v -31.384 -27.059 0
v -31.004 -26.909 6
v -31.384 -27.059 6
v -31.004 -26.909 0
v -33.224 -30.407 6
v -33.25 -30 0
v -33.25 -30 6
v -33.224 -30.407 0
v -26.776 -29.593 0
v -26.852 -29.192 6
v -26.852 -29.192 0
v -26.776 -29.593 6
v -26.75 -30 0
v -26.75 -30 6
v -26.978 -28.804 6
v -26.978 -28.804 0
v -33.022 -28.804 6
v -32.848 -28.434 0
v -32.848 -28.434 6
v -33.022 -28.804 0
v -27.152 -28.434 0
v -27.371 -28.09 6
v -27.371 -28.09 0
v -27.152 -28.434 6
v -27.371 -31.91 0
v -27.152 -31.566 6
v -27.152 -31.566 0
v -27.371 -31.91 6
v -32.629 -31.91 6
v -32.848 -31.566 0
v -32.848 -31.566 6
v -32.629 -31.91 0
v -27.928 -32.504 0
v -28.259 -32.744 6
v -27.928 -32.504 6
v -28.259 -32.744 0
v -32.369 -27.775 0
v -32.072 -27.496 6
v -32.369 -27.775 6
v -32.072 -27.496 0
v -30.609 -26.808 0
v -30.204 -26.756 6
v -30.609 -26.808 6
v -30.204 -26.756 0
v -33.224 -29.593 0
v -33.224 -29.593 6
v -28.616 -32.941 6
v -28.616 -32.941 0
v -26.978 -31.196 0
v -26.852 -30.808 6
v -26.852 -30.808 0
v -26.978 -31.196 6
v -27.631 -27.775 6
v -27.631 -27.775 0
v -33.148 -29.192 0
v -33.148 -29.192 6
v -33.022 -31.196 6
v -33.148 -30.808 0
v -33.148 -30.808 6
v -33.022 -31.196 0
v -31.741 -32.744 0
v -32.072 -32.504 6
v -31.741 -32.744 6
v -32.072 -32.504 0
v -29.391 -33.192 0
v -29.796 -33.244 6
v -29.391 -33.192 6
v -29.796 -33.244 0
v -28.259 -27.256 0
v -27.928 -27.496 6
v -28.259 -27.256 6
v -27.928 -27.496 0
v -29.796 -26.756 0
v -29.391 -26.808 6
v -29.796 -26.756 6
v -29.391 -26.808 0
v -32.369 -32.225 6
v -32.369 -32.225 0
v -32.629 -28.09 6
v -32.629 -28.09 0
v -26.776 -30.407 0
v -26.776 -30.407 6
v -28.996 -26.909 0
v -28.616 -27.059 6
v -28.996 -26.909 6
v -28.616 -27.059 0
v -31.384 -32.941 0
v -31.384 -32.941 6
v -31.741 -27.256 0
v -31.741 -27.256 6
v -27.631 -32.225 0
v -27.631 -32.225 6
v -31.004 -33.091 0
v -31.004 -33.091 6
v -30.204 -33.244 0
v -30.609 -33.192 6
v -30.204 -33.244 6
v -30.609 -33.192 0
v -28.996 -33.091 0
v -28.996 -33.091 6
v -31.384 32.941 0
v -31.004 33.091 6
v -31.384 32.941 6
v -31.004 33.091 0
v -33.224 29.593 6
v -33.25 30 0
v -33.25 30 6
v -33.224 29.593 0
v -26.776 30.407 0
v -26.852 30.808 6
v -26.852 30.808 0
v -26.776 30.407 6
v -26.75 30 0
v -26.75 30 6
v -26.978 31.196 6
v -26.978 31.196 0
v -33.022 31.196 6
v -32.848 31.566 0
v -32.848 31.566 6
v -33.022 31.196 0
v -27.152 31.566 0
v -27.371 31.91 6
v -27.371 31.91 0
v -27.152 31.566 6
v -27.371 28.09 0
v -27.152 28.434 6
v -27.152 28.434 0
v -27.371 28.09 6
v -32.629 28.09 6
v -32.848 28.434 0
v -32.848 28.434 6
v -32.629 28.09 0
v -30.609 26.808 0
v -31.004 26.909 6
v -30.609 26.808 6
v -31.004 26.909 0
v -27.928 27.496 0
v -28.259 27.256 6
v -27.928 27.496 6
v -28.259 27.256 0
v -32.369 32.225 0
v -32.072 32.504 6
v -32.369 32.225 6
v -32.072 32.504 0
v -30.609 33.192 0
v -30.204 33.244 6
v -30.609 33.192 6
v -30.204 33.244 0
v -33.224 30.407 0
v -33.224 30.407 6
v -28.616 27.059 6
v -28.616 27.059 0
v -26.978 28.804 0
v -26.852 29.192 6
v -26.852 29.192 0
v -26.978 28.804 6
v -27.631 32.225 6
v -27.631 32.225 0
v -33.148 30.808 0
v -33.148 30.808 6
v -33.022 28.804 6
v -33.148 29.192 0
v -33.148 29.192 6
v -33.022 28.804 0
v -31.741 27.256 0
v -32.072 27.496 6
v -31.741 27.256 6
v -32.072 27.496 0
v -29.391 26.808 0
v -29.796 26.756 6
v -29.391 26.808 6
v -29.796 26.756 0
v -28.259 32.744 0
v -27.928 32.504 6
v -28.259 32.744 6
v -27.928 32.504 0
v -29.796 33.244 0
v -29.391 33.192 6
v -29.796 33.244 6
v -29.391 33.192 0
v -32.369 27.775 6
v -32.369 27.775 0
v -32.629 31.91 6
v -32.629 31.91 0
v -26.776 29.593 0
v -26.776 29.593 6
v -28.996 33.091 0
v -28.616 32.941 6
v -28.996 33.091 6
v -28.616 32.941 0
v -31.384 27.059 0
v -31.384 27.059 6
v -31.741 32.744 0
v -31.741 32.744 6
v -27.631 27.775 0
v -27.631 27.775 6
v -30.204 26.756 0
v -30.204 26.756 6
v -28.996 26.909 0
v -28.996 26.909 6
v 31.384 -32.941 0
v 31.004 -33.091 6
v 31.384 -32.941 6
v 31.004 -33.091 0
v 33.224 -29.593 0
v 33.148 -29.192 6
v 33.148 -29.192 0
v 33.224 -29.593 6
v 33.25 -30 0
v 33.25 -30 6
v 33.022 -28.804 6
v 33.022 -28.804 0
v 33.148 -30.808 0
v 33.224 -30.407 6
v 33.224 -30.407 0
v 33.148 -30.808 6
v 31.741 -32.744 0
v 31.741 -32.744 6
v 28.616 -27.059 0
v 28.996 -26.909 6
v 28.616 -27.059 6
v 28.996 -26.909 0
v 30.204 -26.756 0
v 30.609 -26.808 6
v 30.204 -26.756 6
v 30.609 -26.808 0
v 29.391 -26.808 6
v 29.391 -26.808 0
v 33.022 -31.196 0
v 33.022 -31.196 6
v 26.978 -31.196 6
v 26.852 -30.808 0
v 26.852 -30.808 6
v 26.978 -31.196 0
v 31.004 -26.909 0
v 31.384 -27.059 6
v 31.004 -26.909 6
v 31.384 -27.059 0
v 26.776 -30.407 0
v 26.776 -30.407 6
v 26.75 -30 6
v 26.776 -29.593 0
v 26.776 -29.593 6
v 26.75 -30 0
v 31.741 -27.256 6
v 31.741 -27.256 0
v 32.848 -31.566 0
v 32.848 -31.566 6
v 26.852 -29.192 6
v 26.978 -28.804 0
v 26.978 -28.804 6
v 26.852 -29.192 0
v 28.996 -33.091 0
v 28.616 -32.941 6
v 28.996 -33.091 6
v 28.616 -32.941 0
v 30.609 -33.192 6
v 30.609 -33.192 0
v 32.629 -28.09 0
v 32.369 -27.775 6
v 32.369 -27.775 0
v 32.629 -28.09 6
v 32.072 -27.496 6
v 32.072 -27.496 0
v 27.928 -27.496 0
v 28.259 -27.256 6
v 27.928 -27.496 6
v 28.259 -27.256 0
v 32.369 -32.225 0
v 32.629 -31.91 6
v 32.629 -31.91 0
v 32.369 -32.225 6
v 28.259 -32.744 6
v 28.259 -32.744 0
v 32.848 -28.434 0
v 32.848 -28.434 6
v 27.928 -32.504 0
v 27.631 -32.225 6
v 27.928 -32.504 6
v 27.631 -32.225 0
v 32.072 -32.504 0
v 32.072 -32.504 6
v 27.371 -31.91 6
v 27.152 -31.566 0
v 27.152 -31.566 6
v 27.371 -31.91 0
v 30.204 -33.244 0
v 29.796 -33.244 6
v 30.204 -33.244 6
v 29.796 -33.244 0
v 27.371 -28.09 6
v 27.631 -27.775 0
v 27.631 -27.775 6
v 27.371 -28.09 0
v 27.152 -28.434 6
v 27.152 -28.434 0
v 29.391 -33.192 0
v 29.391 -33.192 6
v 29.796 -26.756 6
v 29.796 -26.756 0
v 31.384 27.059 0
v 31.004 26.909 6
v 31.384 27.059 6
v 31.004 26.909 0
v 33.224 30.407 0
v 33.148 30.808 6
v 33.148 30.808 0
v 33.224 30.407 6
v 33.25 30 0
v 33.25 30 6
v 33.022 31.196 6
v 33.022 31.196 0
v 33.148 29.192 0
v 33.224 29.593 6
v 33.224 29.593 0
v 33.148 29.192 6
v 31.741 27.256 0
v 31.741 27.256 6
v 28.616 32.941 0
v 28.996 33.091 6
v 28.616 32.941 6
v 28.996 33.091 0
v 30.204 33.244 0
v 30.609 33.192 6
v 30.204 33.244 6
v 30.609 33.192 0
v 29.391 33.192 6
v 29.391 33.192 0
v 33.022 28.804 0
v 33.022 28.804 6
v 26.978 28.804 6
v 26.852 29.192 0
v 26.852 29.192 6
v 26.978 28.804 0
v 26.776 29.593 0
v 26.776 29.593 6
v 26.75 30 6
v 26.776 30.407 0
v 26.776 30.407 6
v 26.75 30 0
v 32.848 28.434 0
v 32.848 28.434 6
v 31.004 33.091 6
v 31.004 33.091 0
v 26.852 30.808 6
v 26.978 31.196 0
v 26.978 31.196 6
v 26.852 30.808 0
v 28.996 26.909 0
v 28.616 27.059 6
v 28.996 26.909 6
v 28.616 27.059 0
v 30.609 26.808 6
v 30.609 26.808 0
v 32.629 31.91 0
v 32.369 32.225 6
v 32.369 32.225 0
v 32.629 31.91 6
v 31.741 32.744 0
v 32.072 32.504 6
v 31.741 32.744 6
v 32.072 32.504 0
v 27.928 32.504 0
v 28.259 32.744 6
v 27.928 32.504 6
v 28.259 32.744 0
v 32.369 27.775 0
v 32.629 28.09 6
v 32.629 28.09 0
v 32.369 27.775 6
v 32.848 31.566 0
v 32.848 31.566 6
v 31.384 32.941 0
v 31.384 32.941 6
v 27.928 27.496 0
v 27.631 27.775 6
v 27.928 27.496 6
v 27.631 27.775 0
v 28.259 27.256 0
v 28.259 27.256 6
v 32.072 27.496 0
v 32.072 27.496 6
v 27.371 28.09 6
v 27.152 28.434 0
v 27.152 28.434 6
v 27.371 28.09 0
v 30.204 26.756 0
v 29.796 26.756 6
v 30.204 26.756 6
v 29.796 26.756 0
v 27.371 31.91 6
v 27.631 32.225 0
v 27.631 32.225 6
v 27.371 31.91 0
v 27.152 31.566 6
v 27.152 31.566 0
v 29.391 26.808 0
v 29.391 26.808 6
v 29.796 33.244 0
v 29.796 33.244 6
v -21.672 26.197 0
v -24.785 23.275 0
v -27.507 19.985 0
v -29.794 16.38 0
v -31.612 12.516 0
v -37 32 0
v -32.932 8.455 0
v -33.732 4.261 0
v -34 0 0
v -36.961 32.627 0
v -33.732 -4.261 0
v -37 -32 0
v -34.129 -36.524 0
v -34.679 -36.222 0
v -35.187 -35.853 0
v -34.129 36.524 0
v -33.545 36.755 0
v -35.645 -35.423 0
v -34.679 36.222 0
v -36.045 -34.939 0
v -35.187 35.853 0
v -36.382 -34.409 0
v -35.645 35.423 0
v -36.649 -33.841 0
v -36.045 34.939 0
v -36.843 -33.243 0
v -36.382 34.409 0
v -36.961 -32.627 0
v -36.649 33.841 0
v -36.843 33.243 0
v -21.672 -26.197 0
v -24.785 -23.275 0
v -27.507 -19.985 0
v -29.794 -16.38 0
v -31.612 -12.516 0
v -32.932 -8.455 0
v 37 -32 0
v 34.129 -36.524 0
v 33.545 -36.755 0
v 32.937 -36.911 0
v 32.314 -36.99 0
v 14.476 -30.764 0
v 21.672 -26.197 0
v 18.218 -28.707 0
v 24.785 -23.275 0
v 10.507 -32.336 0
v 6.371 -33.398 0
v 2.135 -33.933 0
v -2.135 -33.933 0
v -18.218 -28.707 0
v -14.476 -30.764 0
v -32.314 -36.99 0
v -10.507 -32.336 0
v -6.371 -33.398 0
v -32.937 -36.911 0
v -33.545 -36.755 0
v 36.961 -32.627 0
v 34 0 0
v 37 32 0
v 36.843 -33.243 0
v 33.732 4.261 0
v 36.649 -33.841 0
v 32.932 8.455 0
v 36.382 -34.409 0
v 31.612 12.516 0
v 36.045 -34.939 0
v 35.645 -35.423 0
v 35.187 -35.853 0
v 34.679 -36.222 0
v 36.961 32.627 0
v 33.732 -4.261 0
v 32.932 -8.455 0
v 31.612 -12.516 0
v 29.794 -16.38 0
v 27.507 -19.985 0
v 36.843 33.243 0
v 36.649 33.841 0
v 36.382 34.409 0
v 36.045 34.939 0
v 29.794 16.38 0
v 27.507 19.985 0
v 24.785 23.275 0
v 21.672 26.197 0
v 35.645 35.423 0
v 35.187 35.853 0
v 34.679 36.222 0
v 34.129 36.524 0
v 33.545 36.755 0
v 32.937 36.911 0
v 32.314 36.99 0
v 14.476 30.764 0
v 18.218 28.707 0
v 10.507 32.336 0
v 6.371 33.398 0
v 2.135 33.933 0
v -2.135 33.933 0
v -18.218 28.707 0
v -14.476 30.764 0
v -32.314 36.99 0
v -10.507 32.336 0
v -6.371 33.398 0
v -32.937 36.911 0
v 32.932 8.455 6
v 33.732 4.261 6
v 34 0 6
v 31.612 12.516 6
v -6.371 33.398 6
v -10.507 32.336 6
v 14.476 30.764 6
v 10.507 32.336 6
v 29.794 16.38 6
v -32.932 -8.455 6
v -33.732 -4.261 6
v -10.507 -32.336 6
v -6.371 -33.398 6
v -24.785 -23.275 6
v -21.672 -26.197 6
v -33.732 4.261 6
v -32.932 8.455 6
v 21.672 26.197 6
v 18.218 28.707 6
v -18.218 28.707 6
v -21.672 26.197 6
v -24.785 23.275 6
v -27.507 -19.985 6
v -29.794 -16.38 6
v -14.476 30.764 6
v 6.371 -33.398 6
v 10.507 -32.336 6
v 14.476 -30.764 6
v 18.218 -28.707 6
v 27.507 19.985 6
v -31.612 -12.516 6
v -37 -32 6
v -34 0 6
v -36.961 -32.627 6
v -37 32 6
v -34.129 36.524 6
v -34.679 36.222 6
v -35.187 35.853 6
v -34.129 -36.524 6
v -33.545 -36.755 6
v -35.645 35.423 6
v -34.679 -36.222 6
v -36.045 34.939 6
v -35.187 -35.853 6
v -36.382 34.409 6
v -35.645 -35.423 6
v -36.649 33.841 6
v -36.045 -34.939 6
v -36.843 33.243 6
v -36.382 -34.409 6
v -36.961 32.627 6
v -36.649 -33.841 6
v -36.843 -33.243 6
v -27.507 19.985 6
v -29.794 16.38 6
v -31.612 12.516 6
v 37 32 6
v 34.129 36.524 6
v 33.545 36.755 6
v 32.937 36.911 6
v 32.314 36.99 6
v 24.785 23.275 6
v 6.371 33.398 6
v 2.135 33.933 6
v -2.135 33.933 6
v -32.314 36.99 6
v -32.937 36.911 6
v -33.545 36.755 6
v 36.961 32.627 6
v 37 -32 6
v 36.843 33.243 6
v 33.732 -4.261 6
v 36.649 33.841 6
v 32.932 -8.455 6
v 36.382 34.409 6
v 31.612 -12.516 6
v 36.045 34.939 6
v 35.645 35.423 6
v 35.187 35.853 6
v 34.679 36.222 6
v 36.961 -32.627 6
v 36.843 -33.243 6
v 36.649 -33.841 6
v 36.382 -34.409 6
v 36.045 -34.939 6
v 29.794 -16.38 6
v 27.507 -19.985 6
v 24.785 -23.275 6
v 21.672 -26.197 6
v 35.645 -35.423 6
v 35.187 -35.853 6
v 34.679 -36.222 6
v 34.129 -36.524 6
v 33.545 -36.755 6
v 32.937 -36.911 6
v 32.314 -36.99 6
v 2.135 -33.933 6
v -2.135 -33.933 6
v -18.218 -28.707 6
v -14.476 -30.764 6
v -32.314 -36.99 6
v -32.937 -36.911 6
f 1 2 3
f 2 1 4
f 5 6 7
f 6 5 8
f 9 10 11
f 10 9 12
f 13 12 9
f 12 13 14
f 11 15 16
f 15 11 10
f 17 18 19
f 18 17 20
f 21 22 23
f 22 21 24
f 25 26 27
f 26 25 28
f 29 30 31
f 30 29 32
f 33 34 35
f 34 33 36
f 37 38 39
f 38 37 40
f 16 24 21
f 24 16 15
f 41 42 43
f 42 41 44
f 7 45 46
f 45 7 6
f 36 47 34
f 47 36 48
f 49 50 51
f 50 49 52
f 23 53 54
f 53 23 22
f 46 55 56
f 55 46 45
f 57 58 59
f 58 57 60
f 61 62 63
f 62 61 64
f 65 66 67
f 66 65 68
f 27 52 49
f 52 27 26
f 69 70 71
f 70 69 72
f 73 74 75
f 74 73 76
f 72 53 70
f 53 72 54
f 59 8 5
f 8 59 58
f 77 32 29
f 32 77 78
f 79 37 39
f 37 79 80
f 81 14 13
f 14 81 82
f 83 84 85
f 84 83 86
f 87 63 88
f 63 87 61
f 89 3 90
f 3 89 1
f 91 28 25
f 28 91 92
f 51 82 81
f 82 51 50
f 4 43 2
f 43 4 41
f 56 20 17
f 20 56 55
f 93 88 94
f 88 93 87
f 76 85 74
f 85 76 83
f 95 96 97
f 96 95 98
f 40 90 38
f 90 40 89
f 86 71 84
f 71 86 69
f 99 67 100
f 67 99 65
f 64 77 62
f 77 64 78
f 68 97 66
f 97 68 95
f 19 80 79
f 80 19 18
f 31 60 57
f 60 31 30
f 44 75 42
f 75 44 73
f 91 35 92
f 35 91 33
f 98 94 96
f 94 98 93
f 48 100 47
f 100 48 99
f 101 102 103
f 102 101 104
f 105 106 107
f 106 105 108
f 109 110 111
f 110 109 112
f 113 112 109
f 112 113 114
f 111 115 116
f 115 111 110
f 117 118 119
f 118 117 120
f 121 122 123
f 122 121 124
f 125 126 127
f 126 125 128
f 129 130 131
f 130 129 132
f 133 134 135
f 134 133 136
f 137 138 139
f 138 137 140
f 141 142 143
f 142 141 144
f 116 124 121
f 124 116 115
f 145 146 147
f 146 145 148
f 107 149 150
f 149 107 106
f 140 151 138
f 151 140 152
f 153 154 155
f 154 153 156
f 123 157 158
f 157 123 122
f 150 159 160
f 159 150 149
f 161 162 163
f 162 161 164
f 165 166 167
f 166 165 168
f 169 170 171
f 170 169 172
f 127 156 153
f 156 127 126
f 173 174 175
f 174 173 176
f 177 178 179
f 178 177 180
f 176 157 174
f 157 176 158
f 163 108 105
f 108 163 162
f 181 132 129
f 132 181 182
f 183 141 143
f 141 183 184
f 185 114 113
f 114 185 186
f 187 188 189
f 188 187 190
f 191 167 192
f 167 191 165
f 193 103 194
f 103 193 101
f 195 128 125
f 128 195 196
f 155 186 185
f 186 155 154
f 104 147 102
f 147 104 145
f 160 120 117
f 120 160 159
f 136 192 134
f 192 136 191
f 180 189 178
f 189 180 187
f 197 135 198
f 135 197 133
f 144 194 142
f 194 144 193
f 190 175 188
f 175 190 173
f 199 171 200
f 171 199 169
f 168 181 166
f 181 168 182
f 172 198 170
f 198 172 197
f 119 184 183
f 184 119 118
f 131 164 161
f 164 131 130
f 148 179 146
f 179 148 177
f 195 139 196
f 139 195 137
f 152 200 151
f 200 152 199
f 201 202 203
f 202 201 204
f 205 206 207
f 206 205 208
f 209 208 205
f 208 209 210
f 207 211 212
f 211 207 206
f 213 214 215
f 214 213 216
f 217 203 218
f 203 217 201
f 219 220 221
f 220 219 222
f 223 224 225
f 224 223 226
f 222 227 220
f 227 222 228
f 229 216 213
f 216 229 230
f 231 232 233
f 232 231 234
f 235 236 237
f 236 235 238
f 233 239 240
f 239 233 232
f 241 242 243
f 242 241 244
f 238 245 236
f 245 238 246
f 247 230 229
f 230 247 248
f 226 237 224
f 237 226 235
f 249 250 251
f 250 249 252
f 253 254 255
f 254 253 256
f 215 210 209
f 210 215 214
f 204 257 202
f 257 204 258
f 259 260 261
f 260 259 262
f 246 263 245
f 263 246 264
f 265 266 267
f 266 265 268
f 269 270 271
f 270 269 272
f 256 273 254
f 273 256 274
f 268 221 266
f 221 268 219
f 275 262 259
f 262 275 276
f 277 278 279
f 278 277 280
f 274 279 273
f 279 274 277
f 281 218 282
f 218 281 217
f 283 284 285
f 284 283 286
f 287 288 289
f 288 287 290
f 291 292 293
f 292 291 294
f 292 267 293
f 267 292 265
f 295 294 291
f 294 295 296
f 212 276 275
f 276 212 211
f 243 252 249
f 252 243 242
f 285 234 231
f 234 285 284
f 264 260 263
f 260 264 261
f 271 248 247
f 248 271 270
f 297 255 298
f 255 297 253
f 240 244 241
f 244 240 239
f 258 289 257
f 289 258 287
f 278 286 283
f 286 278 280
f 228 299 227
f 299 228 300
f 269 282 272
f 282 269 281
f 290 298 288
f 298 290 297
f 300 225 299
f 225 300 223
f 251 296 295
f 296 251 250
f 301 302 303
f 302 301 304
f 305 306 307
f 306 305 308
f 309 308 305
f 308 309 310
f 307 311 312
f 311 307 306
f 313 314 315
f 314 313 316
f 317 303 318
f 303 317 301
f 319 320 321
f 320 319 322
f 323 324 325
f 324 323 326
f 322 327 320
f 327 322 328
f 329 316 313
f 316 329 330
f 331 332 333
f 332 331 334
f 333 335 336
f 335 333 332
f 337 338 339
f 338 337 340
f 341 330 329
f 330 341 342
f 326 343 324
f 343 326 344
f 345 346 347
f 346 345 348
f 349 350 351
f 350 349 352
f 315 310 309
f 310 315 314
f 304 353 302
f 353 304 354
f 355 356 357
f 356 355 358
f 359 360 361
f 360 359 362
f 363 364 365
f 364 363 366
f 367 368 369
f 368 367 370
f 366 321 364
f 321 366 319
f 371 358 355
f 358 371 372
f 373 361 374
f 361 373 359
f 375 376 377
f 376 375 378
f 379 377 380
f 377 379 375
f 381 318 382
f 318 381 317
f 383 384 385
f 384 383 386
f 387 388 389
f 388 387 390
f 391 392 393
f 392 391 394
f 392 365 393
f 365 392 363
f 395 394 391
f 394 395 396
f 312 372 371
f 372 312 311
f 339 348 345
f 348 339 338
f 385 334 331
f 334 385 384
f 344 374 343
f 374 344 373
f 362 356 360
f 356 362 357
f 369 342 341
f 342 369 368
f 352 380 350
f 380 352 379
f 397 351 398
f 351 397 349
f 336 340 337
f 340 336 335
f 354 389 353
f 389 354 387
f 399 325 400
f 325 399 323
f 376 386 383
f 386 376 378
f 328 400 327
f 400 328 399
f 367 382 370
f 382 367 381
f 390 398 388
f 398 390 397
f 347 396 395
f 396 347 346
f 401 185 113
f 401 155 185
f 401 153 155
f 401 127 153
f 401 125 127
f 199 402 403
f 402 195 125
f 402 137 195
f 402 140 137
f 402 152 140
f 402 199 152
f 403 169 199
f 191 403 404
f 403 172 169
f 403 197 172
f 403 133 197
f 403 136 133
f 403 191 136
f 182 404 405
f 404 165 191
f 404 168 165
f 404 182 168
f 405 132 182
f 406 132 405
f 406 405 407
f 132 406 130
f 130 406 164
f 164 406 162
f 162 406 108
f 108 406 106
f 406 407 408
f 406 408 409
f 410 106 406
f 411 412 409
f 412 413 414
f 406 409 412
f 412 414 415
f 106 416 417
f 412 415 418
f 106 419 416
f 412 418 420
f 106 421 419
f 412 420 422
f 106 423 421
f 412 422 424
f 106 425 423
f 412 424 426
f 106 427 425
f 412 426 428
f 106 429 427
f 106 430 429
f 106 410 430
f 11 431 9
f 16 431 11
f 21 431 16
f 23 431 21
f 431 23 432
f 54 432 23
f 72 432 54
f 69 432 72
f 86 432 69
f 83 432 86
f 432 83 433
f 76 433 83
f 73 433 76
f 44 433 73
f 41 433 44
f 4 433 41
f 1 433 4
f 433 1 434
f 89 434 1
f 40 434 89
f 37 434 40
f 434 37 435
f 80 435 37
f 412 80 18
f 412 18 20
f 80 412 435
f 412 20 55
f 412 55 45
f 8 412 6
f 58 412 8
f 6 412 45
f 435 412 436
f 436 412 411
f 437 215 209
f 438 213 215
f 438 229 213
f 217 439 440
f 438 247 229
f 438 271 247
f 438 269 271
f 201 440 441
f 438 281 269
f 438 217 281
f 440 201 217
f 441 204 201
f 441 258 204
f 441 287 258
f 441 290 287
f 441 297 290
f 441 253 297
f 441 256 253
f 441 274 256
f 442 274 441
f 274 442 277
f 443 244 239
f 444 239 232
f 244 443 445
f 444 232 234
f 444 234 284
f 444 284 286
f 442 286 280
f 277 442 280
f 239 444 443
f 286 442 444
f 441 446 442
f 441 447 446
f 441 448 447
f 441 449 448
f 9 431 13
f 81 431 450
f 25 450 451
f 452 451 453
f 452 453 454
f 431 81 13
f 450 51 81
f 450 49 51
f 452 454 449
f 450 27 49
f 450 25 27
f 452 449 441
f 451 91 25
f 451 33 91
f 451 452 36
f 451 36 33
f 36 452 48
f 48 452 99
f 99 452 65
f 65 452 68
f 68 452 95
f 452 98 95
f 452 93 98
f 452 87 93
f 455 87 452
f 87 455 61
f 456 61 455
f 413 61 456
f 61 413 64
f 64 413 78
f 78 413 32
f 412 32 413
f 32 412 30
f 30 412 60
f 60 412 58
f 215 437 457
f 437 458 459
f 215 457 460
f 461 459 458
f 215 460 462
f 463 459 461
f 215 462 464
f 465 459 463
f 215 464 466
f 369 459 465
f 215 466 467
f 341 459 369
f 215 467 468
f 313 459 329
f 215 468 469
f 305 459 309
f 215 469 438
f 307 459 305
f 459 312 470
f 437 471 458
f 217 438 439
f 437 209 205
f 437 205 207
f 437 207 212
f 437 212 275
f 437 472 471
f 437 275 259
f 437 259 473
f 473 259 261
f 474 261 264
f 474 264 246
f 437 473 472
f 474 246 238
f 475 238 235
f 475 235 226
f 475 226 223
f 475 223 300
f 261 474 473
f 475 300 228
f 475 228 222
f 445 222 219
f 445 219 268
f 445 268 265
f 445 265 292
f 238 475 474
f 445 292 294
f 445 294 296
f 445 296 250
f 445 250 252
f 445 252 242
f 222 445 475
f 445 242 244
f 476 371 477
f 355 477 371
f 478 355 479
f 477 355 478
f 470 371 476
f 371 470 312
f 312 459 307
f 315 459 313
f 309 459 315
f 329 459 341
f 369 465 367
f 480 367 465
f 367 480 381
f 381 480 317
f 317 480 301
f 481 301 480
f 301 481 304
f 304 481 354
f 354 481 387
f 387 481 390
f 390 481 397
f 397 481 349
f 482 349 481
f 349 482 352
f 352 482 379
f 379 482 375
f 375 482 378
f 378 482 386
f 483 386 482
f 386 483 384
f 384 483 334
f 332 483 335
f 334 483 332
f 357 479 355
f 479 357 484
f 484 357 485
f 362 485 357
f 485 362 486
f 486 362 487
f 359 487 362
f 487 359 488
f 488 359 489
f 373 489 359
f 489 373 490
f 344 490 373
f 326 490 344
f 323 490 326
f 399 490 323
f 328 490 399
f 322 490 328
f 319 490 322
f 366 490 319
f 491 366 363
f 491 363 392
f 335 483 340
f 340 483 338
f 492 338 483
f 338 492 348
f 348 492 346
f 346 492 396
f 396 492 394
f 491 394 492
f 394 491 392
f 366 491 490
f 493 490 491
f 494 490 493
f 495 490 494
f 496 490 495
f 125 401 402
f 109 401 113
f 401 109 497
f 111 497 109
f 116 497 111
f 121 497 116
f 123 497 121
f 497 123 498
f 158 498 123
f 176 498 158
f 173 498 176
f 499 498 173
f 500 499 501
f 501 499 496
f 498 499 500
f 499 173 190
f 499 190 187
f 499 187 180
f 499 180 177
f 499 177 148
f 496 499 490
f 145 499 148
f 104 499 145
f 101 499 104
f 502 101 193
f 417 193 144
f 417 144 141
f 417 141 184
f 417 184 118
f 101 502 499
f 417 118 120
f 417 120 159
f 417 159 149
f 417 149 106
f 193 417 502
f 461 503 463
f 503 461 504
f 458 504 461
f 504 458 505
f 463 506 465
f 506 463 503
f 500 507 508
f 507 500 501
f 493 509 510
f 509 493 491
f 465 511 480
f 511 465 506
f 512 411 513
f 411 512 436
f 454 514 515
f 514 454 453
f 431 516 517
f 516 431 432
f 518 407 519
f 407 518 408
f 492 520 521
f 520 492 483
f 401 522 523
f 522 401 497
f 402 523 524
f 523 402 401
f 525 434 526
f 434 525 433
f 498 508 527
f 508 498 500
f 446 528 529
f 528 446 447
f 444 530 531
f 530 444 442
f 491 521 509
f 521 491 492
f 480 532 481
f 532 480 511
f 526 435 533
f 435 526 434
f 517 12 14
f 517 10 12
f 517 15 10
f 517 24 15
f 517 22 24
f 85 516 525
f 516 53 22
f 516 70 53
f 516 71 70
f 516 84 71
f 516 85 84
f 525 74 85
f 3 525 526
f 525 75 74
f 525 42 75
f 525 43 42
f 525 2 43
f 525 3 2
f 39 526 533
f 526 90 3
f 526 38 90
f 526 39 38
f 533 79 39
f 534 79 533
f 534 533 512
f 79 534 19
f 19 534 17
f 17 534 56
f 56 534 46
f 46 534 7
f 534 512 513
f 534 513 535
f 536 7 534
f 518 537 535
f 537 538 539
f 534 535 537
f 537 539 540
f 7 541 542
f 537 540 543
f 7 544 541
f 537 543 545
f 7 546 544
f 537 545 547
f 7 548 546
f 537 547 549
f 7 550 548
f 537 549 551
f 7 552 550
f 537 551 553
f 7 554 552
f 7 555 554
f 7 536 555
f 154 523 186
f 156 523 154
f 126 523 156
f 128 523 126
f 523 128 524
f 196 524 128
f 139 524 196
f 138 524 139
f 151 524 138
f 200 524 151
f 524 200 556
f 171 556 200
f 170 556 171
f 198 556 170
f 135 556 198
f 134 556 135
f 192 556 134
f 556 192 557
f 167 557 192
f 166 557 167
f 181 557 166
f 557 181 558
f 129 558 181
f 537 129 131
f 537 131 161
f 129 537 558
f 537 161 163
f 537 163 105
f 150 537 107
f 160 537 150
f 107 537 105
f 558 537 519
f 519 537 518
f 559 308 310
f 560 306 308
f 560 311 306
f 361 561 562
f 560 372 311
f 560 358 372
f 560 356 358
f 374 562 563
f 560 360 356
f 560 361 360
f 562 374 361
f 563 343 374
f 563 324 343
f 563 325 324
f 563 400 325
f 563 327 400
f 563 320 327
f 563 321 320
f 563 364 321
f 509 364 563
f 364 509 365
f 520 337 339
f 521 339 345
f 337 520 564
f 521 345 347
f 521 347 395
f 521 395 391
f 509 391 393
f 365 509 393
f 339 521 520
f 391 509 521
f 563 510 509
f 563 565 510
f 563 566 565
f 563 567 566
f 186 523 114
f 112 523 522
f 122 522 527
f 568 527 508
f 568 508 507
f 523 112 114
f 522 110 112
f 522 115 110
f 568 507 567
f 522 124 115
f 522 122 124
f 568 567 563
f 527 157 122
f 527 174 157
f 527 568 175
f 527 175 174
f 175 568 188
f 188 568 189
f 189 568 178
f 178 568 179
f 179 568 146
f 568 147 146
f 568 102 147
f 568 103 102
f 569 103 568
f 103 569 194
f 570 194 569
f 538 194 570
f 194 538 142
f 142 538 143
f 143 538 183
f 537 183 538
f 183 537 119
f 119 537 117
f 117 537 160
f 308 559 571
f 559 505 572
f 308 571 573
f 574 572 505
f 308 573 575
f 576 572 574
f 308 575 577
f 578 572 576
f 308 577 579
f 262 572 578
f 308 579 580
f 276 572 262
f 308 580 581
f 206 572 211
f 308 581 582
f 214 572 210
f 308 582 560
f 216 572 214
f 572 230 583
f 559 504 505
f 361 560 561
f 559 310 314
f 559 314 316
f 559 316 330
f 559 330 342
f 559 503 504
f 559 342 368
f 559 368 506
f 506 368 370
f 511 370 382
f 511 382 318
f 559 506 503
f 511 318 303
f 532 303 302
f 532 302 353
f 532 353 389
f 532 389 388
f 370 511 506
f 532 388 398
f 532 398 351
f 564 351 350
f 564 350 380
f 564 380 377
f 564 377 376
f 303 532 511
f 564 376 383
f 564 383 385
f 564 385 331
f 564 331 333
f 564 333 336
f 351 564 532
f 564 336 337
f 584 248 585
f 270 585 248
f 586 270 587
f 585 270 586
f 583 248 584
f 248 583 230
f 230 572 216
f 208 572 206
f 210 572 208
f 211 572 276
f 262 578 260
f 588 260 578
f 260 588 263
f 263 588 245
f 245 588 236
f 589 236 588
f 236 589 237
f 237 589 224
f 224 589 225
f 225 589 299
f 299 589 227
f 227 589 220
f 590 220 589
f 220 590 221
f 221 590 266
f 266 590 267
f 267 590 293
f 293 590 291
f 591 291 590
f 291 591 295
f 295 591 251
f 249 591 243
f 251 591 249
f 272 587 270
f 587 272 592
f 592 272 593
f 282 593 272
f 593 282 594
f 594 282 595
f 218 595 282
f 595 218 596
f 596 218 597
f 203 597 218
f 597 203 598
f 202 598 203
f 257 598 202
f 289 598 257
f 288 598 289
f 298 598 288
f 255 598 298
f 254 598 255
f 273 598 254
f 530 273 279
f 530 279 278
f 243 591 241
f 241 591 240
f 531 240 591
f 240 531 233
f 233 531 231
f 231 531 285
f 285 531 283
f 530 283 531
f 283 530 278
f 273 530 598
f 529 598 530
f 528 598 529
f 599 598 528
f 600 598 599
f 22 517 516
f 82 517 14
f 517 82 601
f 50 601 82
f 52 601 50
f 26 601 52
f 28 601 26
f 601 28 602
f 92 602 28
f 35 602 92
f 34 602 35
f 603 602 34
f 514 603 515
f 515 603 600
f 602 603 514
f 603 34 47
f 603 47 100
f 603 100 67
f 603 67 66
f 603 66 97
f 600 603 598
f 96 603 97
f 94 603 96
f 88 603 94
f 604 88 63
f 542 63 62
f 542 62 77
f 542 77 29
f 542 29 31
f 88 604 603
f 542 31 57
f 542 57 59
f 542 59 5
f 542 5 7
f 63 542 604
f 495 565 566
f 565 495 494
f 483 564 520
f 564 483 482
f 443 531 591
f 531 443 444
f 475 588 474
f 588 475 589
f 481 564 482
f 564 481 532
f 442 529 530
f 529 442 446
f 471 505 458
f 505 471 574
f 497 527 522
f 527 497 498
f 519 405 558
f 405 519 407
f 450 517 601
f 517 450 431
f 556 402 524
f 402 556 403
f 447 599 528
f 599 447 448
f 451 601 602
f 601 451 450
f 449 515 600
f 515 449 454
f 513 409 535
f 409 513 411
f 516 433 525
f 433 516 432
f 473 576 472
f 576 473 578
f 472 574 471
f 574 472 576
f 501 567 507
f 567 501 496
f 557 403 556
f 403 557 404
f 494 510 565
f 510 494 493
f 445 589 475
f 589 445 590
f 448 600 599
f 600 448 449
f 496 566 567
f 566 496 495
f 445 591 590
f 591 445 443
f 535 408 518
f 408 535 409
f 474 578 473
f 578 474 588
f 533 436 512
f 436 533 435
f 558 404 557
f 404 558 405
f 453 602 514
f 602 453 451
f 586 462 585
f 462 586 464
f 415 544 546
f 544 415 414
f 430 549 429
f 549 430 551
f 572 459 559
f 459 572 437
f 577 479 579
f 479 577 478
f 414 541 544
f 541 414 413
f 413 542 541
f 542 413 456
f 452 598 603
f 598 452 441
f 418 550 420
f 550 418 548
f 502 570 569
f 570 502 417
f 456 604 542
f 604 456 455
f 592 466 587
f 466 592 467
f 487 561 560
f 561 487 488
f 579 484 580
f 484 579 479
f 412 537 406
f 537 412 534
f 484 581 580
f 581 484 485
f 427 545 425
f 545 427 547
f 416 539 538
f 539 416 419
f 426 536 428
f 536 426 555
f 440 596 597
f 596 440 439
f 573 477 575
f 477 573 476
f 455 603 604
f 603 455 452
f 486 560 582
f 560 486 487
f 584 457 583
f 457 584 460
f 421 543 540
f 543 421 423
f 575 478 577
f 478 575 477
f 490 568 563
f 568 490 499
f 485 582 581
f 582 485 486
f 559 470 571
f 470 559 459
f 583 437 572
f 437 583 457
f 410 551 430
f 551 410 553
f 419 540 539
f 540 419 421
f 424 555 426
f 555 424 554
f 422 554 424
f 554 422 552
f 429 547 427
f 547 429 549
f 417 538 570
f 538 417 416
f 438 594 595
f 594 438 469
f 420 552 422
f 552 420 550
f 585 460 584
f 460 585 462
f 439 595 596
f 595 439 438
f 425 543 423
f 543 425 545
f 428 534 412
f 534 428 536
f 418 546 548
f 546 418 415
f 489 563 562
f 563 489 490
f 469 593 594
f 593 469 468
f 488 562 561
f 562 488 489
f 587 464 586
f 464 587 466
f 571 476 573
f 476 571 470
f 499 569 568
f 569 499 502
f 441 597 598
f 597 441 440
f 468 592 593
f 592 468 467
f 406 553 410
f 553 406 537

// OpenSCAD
$fn = 50;

difference() {
	union() {
		hull() {
			translate(v = [-32.0, 32.0, 0]) {
				cylinder(h = 6, r = 5);
			}
			translate(v = [32.0, 32.0, 0]) {
				cylinder(h = 6, r = 5);
			}
			translate(v = [-32.0, -32.0, 0]) {
				cylinder(h = 6, r = 5);
			}
			translate(v = [32.0, -32.0, 0]) {
				cylinder(h = 6, r = 5);
			}
		}
	}
	union() {
		translate(v = [-30.0, -30.0, -100.0]) {
			cylinder(h = 200, r = 3.25);
		}
		translate(v = [-30.0, 30.0, -100.0]) {
			cylinder(h = 200, r = 3.25);
		}
		translate(v = [30.0, -30.0, -100.0]) {
			cylinder(h = 200, r = 3.25);
		}
		translate(v = [30.0, 30.0, -100.0]) {
			cylinder(h = 200, r = 3.25);
		}
		translate(v = [-30.0, -30.0, -100.0]) {
			cylinder(h = 200, r = 1.8);
		}
		translate(v = [-30.0, 30.0, -100.0]) {
			cylinder(h = 200, r = 1.8);
		}
		translate(v = [30.0, -30.0, -100.0]) {
			cylinder(h = 200, r = 1.8);
		}
		translate(v = [30.0, 30.0, -100.0]) {
			cylinder(h = 200, r = 1.8);
		}
		cylinder(h = 6, r = 34.0);
	}
}
